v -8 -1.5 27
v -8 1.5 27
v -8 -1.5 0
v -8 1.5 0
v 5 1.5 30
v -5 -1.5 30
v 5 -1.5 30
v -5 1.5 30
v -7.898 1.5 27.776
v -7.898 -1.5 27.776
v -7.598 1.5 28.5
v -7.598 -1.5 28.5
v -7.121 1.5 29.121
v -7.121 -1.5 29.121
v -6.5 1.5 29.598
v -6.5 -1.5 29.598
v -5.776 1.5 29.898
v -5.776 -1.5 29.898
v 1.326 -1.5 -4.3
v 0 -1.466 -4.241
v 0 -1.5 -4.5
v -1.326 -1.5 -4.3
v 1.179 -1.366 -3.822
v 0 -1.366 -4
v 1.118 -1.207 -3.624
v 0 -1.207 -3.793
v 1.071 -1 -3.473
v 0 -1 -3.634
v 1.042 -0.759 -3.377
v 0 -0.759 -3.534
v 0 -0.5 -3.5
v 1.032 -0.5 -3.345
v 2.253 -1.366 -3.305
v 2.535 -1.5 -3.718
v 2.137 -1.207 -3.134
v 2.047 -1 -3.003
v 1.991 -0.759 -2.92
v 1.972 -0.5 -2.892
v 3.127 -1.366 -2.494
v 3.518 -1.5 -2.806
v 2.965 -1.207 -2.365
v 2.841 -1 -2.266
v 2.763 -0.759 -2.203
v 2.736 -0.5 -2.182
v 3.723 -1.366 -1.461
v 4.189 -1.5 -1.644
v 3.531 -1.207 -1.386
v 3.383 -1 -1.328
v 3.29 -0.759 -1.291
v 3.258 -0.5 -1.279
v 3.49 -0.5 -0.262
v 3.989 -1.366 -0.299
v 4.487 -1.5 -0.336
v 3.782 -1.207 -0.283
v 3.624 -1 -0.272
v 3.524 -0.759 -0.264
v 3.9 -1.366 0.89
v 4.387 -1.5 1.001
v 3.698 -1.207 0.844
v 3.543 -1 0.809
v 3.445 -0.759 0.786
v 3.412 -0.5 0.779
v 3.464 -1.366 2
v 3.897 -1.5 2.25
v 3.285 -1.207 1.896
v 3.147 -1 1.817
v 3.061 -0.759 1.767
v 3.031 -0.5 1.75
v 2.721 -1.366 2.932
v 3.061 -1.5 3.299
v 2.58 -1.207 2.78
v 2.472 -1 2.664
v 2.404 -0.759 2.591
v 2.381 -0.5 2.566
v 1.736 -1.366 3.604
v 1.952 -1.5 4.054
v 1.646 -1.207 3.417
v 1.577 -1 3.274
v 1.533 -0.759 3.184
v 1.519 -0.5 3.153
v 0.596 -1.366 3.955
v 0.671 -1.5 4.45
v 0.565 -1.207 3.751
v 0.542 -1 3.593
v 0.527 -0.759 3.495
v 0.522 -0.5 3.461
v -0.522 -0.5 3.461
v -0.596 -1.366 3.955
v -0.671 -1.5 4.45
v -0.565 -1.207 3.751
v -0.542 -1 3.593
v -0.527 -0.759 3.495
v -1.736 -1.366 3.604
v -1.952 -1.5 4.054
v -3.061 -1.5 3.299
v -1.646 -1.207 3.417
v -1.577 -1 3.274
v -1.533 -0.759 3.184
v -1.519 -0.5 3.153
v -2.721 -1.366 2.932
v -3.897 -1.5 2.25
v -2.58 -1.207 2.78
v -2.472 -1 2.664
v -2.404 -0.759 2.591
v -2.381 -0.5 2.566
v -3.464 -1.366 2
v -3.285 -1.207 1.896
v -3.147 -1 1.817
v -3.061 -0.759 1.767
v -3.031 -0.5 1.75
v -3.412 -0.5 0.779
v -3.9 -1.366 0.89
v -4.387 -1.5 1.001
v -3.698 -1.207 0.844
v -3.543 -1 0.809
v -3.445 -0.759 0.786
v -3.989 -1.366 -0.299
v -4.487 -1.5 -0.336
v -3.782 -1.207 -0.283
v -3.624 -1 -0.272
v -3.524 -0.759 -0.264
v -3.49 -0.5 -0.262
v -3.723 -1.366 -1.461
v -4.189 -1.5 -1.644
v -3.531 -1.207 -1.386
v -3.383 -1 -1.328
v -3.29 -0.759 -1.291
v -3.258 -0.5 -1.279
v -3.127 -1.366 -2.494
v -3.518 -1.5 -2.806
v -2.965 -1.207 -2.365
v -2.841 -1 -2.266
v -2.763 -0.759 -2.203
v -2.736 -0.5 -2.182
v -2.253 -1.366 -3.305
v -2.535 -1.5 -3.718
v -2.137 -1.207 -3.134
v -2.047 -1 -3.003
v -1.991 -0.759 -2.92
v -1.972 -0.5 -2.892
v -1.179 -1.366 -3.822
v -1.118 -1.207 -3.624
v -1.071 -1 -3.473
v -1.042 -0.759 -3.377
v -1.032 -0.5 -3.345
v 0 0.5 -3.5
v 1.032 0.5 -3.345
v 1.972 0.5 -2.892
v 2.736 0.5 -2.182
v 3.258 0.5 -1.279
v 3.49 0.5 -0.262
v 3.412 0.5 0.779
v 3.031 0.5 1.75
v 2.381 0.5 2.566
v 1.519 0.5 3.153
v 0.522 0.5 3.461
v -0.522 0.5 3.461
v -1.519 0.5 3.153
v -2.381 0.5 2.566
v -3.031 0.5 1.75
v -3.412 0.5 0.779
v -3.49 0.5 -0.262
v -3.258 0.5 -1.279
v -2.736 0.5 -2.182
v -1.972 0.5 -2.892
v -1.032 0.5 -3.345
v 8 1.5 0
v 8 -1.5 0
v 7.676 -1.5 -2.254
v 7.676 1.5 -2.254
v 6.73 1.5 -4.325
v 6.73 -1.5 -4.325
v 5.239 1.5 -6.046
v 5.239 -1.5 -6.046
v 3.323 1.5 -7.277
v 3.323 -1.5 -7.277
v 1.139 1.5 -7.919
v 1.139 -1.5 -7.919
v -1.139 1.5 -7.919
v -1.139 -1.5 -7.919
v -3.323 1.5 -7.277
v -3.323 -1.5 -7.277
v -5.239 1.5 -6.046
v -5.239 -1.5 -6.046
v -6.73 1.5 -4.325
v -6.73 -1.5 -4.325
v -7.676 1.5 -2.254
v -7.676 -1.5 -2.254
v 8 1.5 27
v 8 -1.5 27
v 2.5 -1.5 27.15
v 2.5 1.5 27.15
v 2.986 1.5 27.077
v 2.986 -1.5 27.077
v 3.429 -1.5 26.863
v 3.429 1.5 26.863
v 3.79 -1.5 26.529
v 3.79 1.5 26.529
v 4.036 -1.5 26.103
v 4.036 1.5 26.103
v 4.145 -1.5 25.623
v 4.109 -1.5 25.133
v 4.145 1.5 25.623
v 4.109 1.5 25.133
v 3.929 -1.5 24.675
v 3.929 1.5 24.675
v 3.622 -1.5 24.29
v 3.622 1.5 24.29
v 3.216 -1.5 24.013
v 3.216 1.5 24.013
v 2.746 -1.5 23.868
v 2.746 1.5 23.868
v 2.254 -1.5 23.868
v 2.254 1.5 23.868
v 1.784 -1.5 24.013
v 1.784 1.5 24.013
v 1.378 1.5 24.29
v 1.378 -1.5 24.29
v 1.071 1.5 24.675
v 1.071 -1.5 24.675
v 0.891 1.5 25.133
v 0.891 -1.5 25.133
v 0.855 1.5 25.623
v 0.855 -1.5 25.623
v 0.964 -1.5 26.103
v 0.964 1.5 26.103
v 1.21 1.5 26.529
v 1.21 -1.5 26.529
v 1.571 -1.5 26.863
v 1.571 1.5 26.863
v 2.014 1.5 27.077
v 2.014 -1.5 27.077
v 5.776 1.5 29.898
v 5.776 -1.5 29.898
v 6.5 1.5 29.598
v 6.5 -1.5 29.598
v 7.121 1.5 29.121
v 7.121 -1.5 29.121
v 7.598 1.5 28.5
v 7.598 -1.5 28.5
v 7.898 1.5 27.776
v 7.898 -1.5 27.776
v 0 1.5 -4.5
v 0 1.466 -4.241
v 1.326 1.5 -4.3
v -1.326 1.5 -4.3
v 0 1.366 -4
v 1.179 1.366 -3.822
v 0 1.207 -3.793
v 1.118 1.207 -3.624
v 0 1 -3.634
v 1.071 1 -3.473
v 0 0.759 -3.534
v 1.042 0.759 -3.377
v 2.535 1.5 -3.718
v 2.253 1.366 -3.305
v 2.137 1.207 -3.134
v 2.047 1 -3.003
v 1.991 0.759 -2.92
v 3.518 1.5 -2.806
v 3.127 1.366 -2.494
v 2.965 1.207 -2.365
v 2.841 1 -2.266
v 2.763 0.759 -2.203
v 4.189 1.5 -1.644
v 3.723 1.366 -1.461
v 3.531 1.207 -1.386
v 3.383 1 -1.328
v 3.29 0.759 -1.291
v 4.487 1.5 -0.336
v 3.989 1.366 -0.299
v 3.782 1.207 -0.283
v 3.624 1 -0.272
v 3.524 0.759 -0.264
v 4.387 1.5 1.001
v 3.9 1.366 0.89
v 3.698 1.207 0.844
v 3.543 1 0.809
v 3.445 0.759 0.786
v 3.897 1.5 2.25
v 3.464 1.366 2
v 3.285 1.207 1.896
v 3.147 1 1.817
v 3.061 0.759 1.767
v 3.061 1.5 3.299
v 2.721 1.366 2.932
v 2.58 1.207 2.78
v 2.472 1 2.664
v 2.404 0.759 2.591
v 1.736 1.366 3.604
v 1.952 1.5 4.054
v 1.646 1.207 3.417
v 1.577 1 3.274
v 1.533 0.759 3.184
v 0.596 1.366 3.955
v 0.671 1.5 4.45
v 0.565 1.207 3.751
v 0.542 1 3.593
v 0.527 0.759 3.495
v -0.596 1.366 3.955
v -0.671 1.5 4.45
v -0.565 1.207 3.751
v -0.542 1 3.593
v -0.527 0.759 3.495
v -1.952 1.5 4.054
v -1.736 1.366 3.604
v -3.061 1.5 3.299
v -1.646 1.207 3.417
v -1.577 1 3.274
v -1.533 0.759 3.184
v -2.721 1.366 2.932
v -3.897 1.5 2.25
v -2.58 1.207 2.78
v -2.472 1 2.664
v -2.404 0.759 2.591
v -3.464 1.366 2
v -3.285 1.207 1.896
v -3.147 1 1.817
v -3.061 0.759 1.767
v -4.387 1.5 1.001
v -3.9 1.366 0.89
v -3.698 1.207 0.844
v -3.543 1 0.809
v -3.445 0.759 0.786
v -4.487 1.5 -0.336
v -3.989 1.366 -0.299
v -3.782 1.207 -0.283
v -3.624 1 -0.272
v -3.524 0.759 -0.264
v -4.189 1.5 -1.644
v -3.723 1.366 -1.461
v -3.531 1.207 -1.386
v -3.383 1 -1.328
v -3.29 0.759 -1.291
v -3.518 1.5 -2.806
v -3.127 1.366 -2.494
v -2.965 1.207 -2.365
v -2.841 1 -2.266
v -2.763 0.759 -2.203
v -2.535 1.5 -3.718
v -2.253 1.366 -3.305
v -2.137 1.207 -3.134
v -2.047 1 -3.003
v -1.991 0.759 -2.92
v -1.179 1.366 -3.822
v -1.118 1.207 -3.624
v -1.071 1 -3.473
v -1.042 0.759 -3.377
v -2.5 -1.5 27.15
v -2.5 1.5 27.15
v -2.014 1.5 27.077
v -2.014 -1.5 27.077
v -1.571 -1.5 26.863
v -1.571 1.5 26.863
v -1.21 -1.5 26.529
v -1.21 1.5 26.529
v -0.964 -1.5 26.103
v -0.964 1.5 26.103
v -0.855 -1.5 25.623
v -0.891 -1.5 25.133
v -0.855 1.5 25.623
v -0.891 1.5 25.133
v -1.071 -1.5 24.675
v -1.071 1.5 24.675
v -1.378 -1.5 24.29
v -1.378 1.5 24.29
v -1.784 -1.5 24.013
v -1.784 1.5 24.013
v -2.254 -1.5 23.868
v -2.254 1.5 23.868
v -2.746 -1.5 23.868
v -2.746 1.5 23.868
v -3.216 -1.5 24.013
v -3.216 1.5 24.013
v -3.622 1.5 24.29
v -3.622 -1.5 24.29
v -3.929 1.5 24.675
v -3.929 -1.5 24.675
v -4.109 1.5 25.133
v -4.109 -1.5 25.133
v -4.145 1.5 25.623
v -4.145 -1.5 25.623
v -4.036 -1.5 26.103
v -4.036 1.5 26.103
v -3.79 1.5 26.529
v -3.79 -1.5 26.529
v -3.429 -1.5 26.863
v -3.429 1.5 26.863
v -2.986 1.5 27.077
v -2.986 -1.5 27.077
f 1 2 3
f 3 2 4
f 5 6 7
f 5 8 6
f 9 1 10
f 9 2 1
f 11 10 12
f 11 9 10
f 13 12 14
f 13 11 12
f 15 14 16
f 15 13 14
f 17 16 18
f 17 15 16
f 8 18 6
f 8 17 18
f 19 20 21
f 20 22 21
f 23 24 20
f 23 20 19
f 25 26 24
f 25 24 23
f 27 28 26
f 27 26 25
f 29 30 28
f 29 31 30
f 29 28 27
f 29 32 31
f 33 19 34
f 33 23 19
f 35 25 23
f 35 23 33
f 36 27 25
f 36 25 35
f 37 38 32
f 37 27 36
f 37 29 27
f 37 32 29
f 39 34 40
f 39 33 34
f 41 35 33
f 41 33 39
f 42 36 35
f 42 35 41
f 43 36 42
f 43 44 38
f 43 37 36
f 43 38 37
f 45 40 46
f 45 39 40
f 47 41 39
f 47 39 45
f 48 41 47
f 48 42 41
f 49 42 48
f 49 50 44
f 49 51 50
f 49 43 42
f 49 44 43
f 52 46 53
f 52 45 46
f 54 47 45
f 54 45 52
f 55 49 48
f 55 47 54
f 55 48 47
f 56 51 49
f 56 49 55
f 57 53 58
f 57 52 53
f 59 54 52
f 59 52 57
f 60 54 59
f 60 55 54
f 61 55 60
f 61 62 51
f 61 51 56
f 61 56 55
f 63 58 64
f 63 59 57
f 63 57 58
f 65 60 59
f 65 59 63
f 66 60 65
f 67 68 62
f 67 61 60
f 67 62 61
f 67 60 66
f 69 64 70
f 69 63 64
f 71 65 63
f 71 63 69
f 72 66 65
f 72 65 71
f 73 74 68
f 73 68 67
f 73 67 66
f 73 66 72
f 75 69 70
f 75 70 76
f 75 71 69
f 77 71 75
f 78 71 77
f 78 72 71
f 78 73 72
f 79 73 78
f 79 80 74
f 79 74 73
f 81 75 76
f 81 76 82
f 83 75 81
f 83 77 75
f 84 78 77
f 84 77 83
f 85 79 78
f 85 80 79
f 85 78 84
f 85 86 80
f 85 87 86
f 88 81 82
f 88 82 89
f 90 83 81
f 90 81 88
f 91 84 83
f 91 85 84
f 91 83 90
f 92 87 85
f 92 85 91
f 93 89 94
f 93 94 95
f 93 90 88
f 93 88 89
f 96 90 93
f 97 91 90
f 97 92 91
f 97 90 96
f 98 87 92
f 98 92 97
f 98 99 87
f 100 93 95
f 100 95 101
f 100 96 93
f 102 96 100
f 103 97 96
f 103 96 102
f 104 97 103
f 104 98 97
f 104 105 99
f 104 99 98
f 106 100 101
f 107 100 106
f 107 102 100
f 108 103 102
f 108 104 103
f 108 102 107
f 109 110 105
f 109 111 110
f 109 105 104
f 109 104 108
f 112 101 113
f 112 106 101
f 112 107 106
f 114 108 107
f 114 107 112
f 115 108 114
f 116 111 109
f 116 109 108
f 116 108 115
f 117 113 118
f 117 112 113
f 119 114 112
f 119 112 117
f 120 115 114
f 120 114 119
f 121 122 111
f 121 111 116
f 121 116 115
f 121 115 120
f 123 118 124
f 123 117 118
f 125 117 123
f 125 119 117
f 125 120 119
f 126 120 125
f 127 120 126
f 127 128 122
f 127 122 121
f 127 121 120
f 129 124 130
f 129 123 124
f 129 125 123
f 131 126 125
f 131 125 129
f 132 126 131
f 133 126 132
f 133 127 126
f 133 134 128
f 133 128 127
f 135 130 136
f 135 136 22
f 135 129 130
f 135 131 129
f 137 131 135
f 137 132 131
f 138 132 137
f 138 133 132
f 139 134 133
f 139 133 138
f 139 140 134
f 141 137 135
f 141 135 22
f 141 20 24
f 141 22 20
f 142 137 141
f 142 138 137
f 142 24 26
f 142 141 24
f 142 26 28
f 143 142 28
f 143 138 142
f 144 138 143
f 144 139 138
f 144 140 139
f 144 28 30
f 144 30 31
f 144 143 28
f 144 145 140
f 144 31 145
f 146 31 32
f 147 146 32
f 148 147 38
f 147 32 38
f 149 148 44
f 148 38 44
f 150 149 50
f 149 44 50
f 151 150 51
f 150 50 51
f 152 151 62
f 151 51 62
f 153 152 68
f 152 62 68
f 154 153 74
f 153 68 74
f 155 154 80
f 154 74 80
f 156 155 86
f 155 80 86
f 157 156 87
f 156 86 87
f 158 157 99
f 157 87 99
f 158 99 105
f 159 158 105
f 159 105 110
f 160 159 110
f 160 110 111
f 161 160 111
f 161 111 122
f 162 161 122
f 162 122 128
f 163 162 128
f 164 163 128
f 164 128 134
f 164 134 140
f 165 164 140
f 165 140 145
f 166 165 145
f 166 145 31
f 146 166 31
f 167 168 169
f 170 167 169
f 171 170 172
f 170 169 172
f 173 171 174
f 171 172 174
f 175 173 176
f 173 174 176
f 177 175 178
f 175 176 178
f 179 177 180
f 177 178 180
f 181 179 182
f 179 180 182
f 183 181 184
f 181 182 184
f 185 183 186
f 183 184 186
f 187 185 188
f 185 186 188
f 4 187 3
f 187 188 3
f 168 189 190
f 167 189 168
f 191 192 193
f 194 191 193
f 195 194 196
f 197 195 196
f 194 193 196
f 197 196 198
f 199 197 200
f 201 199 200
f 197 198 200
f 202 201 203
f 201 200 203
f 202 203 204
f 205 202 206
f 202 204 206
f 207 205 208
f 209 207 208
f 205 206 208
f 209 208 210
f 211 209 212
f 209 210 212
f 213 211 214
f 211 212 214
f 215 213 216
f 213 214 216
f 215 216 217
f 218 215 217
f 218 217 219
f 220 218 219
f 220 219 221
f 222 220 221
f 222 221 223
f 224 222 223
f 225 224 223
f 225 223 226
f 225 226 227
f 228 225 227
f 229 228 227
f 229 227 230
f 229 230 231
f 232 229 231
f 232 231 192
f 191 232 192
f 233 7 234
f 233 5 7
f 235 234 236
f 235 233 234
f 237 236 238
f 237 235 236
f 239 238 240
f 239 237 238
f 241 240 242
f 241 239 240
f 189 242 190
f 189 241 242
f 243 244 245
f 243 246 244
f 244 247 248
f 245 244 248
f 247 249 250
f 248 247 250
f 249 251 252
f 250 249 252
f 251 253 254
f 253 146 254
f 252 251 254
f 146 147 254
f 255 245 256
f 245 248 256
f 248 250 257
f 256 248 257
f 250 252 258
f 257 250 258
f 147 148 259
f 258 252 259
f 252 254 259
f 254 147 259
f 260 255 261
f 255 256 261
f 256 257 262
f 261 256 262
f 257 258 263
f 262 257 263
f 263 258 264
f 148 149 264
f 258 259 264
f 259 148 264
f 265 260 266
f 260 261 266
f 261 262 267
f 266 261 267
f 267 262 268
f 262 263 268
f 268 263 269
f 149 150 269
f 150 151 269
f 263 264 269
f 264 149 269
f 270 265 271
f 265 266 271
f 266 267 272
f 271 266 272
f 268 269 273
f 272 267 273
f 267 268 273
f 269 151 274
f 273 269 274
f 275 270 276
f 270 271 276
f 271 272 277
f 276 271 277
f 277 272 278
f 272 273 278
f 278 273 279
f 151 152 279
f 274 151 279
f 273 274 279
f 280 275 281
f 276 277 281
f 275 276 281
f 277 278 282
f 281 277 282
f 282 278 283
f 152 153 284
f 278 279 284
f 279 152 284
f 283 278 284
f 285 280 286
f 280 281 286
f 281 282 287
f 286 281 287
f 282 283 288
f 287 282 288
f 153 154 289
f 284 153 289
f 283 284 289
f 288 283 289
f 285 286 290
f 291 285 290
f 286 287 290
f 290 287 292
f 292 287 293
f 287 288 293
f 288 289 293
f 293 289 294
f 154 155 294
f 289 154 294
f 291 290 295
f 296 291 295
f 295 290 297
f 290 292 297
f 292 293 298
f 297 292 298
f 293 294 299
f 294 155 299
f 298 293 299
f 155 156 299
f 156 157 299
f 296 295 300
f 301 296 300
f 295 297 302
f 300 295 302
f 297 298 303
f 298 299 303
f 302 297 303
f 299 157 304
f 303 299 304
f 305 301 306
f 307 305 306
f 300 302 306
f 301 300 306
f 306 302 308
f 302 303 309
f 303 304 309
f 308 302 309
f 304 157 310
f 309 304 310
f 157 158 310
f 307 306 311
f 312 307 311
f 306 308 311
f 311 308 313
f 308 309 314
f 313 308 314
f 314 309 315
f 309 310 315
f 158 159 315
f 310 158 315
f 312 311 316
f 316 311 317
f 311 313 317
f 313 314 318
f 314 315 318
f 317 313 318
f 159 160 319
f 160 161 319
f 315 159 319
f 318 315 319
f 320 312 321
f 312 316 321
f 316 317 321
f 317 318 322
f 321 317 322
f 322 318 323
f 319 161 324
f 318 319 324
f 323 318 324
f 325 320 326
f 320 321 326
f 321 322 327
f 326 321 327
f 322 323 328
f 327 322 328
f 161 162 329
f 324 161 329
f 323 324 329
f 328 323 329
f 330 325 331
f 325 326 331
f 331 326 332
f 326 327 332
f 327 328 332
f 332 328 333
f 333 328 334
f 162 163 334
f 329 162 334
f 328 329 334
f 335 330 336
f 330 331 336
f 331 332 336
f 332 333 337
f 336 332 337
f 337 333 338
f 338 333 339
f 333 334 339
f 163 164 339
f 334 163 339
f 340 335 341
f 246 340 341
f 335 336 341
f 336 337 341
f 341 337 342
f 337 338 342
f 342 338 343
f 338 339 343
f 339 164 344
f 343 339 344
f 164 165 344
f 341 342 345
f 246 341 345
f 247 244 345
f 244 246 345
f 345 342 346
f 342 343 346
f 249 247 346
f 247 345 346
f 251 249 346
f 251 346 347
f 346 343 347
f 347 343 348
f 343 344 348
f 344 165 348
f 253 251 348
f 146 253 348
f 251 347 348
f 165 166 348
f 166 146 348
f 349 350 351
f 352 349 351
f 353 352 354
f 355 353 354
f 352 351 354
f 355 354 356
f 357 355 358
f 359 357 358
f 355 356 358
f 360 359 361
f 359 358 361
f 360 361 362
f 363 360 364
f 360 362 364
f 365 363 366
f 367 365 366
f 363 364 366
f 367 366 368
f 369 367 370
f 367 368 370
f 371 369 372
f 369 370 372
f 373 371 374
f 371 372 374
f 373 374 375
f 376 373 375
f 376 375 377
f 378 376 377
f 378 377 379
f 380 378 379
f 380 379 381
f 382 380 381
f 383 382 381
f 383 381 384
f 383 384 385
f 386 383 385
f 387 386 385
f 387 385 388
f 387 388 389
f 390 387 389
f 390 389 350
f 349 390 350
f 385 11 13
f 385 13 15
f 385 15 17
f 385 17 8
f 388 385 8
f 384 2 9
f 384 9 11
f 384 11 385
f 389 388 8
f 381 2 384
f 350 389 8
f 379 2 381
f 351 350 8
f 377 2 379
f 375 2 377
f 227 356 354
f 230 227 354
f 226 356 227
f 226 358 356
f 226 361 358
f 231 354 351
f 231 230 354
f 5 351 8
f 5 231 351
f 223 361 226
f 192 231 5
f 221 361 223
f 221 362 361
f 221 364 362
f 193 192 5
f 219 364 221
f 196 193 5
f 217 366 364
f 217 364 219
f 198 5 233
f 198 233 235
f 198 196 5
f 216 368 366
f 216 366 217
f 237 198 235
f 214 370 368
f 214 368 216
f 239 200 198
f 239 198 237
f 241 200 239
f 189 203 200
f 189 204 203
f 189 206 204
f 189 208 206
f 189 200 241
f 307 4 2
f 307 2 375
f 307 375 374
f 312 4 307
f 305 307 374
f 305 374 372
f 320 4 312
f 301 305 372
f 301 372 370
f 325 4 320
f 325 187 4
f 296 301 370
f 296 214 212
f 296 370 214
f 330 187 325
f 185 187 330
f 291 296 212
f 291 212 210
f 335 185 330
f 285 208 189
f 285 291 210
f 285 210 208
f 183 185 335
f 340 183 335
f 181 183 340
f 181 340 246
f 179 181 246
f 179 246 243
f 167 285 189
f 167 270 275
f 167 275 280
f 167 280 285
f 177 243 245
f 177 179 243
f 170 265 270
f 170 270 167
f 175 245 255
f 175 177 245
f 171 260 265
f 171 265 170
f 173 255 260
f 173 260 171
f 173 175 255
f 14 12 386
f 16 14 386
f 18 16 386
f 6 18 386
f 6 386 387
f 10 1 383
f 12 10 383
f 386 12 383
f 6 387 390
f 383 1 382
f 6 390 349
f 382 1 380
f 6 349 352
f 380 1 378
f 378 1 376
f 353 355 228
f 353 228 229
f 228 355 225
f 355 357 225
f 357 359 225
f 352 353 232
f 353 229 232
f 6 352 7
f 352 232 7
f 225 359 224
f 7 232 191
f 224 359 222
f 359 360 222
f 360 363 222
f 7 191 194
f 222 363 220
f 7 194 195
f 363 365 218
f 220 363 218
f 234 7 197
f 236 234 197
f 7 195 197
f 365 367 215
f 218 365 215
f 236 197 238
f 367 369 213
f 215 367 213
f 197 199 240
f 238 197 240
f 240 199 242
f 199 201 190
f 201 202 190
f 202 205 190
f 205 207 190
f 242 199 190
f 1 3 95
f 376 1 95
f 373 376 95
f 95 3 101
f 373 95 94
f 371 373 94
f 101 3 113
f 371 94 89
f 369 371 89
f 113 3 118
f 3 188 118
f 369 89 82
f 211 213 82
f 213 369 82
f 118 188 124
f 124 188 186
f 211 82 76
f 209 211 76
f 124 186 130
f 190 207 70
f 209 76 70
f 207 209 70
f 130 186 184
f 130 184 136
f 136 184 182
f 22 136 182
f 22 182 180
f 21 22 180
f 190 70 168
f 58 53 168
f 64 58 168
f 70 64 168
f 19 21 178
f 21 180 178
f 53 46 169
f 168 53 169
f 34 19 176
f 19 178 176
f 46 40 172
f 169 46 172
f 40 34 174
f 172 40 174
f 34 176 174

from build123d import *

# Parameters (mm, degrees)
BOSS_EXTRUDE1_DEPTH      = 1.5
BOSS_EXTRUDE1_DEPTH_BACK = 1.5
SKETCH2_R                = 8
SKETCH3_W                = 16
SKETCH3_H                = 30
BOSS_EXTRUDE2_DEPTH      = 1.5
CUT_EXTRUDE1_REACH       = 33.193
SKETCH4_R                = 1.65
CUT_EXTRUDE2_REACH       = 33.193
SKETCH5_R                = 3.5
FILLET1_R                = 1
FILLET2_R                = 3


with BuildPart() as part:
    # Sketch2 → Boss-Extrude1 (new, two sides: drawn at the far end of the back side and taken through both)
    with BuildSketch(Plane(origin=(0, 0, 0), x_dir=(1, 0, 0), z_dir=(0, 1, 0)).offset(-BOSS_EXTRUDE1_DEPTH_BACK)):
        Circle(SKETCH2_R)
    extrude(amount=BOSS_EXTRUDE1_DEPTH + BOSS_EXTRUDE1_DEPTH_BACK)

    # Sketch3 → Boss-Extrude2 (add, symmetric)
    with BuildSketch(Plane(origin=(0, 0, 0), x_dir=(1, 0, 0), z_dir=(0, 1, 0))):
        with Locations((0, -15)):
            Rectangle(SKETCH3_W, SKETCH3_H)
    extrude(amount=BOSS_EXTRUDE2_DEPTH, both=True)

    # Sketch4 → Cut-Extrude1 (cut, up to next)
    with BuildSketch(Plane(origin=(0, 1.5, 0), x_dir=(1, 0, 0), z_dir=(0, 1, 0)), mode=Mode.PRIVATE) as cut_extrude1_sk1:
        with Locations((2.5, -25.5)):
            Circle(SKETCH4_R)
    cut_extrude1_tool1 = extrude(cut_extrude1_sk1.sketch, amount=-CUT_EXTRUDE1_REACH, mode=Mode.PRIVATE) & part.part
    # Sketch4 → Cut-Extrude1 (cut, up to next)
    with BuildSketch(Plane(origin=(0, 1.5, 0), x_dir=(1, 0, 0), z_dir=(0, 1, 0)), mode=Mode.PRIVATE) as cut_extrude1_sk2:
        with Locations((-2.5, -25.5)):
            Circle(SKETCH4_R)
    cut_extrude1_tool2 = extrude(cut_extrude1_sk2.sketch, amount=-CUT_EXTRUDE1_REACH, mode=Mode.PRIVATE) & part.part
    add(cut_extrude1_tool1.solids().sort_by_distance((2.5, 1.5, 25.5))[0], mode=Mode.SUBTRACT)
    add(cut_extrude1_tool2.solids().sort_by_distance((-2.5, 1.5, 25.5))[0], mode=Mode.SUBTRACT)

    # Sketch5 → Cut-Extrude2 (cut, up to next)
    with BuildSketch(Plane.XZ.offset(1.5), mode=Mode.PRIVATE) as cut_extrude2_sk1:
        Circle(SKETCH5_R)
    cut_extrude2_tool1 = extrude(cut_extrude2_sk1.sketch, amount=-CUT_EXTRUDE2_REACH, mode=Mode.PRIVATE) & part.part
    add(cut_extrude2_tool1.solids().sort_by_distance((0, -1.5, 0))[0], mode=Mode.SUBTRACT)

    # Fillet1
    fillet1_edges = [part.edges().sort_by_distance(p)[0] for p in [
        (-3.5, 1.5, 0),
        (-3.5, -1.5, 0),
    ]]
    fillet(fillet1_edges, radius=FILLET1_R)

    # Fillet2
    fillet2_edges = [part.edges().sort_by_distance(p)[0] for p in [
        (-8, 0, 30),
        (8, 0, 30),
    ]]
    fillet(fillet2_edges, radius=FILLET2_R)


solid = part.part
